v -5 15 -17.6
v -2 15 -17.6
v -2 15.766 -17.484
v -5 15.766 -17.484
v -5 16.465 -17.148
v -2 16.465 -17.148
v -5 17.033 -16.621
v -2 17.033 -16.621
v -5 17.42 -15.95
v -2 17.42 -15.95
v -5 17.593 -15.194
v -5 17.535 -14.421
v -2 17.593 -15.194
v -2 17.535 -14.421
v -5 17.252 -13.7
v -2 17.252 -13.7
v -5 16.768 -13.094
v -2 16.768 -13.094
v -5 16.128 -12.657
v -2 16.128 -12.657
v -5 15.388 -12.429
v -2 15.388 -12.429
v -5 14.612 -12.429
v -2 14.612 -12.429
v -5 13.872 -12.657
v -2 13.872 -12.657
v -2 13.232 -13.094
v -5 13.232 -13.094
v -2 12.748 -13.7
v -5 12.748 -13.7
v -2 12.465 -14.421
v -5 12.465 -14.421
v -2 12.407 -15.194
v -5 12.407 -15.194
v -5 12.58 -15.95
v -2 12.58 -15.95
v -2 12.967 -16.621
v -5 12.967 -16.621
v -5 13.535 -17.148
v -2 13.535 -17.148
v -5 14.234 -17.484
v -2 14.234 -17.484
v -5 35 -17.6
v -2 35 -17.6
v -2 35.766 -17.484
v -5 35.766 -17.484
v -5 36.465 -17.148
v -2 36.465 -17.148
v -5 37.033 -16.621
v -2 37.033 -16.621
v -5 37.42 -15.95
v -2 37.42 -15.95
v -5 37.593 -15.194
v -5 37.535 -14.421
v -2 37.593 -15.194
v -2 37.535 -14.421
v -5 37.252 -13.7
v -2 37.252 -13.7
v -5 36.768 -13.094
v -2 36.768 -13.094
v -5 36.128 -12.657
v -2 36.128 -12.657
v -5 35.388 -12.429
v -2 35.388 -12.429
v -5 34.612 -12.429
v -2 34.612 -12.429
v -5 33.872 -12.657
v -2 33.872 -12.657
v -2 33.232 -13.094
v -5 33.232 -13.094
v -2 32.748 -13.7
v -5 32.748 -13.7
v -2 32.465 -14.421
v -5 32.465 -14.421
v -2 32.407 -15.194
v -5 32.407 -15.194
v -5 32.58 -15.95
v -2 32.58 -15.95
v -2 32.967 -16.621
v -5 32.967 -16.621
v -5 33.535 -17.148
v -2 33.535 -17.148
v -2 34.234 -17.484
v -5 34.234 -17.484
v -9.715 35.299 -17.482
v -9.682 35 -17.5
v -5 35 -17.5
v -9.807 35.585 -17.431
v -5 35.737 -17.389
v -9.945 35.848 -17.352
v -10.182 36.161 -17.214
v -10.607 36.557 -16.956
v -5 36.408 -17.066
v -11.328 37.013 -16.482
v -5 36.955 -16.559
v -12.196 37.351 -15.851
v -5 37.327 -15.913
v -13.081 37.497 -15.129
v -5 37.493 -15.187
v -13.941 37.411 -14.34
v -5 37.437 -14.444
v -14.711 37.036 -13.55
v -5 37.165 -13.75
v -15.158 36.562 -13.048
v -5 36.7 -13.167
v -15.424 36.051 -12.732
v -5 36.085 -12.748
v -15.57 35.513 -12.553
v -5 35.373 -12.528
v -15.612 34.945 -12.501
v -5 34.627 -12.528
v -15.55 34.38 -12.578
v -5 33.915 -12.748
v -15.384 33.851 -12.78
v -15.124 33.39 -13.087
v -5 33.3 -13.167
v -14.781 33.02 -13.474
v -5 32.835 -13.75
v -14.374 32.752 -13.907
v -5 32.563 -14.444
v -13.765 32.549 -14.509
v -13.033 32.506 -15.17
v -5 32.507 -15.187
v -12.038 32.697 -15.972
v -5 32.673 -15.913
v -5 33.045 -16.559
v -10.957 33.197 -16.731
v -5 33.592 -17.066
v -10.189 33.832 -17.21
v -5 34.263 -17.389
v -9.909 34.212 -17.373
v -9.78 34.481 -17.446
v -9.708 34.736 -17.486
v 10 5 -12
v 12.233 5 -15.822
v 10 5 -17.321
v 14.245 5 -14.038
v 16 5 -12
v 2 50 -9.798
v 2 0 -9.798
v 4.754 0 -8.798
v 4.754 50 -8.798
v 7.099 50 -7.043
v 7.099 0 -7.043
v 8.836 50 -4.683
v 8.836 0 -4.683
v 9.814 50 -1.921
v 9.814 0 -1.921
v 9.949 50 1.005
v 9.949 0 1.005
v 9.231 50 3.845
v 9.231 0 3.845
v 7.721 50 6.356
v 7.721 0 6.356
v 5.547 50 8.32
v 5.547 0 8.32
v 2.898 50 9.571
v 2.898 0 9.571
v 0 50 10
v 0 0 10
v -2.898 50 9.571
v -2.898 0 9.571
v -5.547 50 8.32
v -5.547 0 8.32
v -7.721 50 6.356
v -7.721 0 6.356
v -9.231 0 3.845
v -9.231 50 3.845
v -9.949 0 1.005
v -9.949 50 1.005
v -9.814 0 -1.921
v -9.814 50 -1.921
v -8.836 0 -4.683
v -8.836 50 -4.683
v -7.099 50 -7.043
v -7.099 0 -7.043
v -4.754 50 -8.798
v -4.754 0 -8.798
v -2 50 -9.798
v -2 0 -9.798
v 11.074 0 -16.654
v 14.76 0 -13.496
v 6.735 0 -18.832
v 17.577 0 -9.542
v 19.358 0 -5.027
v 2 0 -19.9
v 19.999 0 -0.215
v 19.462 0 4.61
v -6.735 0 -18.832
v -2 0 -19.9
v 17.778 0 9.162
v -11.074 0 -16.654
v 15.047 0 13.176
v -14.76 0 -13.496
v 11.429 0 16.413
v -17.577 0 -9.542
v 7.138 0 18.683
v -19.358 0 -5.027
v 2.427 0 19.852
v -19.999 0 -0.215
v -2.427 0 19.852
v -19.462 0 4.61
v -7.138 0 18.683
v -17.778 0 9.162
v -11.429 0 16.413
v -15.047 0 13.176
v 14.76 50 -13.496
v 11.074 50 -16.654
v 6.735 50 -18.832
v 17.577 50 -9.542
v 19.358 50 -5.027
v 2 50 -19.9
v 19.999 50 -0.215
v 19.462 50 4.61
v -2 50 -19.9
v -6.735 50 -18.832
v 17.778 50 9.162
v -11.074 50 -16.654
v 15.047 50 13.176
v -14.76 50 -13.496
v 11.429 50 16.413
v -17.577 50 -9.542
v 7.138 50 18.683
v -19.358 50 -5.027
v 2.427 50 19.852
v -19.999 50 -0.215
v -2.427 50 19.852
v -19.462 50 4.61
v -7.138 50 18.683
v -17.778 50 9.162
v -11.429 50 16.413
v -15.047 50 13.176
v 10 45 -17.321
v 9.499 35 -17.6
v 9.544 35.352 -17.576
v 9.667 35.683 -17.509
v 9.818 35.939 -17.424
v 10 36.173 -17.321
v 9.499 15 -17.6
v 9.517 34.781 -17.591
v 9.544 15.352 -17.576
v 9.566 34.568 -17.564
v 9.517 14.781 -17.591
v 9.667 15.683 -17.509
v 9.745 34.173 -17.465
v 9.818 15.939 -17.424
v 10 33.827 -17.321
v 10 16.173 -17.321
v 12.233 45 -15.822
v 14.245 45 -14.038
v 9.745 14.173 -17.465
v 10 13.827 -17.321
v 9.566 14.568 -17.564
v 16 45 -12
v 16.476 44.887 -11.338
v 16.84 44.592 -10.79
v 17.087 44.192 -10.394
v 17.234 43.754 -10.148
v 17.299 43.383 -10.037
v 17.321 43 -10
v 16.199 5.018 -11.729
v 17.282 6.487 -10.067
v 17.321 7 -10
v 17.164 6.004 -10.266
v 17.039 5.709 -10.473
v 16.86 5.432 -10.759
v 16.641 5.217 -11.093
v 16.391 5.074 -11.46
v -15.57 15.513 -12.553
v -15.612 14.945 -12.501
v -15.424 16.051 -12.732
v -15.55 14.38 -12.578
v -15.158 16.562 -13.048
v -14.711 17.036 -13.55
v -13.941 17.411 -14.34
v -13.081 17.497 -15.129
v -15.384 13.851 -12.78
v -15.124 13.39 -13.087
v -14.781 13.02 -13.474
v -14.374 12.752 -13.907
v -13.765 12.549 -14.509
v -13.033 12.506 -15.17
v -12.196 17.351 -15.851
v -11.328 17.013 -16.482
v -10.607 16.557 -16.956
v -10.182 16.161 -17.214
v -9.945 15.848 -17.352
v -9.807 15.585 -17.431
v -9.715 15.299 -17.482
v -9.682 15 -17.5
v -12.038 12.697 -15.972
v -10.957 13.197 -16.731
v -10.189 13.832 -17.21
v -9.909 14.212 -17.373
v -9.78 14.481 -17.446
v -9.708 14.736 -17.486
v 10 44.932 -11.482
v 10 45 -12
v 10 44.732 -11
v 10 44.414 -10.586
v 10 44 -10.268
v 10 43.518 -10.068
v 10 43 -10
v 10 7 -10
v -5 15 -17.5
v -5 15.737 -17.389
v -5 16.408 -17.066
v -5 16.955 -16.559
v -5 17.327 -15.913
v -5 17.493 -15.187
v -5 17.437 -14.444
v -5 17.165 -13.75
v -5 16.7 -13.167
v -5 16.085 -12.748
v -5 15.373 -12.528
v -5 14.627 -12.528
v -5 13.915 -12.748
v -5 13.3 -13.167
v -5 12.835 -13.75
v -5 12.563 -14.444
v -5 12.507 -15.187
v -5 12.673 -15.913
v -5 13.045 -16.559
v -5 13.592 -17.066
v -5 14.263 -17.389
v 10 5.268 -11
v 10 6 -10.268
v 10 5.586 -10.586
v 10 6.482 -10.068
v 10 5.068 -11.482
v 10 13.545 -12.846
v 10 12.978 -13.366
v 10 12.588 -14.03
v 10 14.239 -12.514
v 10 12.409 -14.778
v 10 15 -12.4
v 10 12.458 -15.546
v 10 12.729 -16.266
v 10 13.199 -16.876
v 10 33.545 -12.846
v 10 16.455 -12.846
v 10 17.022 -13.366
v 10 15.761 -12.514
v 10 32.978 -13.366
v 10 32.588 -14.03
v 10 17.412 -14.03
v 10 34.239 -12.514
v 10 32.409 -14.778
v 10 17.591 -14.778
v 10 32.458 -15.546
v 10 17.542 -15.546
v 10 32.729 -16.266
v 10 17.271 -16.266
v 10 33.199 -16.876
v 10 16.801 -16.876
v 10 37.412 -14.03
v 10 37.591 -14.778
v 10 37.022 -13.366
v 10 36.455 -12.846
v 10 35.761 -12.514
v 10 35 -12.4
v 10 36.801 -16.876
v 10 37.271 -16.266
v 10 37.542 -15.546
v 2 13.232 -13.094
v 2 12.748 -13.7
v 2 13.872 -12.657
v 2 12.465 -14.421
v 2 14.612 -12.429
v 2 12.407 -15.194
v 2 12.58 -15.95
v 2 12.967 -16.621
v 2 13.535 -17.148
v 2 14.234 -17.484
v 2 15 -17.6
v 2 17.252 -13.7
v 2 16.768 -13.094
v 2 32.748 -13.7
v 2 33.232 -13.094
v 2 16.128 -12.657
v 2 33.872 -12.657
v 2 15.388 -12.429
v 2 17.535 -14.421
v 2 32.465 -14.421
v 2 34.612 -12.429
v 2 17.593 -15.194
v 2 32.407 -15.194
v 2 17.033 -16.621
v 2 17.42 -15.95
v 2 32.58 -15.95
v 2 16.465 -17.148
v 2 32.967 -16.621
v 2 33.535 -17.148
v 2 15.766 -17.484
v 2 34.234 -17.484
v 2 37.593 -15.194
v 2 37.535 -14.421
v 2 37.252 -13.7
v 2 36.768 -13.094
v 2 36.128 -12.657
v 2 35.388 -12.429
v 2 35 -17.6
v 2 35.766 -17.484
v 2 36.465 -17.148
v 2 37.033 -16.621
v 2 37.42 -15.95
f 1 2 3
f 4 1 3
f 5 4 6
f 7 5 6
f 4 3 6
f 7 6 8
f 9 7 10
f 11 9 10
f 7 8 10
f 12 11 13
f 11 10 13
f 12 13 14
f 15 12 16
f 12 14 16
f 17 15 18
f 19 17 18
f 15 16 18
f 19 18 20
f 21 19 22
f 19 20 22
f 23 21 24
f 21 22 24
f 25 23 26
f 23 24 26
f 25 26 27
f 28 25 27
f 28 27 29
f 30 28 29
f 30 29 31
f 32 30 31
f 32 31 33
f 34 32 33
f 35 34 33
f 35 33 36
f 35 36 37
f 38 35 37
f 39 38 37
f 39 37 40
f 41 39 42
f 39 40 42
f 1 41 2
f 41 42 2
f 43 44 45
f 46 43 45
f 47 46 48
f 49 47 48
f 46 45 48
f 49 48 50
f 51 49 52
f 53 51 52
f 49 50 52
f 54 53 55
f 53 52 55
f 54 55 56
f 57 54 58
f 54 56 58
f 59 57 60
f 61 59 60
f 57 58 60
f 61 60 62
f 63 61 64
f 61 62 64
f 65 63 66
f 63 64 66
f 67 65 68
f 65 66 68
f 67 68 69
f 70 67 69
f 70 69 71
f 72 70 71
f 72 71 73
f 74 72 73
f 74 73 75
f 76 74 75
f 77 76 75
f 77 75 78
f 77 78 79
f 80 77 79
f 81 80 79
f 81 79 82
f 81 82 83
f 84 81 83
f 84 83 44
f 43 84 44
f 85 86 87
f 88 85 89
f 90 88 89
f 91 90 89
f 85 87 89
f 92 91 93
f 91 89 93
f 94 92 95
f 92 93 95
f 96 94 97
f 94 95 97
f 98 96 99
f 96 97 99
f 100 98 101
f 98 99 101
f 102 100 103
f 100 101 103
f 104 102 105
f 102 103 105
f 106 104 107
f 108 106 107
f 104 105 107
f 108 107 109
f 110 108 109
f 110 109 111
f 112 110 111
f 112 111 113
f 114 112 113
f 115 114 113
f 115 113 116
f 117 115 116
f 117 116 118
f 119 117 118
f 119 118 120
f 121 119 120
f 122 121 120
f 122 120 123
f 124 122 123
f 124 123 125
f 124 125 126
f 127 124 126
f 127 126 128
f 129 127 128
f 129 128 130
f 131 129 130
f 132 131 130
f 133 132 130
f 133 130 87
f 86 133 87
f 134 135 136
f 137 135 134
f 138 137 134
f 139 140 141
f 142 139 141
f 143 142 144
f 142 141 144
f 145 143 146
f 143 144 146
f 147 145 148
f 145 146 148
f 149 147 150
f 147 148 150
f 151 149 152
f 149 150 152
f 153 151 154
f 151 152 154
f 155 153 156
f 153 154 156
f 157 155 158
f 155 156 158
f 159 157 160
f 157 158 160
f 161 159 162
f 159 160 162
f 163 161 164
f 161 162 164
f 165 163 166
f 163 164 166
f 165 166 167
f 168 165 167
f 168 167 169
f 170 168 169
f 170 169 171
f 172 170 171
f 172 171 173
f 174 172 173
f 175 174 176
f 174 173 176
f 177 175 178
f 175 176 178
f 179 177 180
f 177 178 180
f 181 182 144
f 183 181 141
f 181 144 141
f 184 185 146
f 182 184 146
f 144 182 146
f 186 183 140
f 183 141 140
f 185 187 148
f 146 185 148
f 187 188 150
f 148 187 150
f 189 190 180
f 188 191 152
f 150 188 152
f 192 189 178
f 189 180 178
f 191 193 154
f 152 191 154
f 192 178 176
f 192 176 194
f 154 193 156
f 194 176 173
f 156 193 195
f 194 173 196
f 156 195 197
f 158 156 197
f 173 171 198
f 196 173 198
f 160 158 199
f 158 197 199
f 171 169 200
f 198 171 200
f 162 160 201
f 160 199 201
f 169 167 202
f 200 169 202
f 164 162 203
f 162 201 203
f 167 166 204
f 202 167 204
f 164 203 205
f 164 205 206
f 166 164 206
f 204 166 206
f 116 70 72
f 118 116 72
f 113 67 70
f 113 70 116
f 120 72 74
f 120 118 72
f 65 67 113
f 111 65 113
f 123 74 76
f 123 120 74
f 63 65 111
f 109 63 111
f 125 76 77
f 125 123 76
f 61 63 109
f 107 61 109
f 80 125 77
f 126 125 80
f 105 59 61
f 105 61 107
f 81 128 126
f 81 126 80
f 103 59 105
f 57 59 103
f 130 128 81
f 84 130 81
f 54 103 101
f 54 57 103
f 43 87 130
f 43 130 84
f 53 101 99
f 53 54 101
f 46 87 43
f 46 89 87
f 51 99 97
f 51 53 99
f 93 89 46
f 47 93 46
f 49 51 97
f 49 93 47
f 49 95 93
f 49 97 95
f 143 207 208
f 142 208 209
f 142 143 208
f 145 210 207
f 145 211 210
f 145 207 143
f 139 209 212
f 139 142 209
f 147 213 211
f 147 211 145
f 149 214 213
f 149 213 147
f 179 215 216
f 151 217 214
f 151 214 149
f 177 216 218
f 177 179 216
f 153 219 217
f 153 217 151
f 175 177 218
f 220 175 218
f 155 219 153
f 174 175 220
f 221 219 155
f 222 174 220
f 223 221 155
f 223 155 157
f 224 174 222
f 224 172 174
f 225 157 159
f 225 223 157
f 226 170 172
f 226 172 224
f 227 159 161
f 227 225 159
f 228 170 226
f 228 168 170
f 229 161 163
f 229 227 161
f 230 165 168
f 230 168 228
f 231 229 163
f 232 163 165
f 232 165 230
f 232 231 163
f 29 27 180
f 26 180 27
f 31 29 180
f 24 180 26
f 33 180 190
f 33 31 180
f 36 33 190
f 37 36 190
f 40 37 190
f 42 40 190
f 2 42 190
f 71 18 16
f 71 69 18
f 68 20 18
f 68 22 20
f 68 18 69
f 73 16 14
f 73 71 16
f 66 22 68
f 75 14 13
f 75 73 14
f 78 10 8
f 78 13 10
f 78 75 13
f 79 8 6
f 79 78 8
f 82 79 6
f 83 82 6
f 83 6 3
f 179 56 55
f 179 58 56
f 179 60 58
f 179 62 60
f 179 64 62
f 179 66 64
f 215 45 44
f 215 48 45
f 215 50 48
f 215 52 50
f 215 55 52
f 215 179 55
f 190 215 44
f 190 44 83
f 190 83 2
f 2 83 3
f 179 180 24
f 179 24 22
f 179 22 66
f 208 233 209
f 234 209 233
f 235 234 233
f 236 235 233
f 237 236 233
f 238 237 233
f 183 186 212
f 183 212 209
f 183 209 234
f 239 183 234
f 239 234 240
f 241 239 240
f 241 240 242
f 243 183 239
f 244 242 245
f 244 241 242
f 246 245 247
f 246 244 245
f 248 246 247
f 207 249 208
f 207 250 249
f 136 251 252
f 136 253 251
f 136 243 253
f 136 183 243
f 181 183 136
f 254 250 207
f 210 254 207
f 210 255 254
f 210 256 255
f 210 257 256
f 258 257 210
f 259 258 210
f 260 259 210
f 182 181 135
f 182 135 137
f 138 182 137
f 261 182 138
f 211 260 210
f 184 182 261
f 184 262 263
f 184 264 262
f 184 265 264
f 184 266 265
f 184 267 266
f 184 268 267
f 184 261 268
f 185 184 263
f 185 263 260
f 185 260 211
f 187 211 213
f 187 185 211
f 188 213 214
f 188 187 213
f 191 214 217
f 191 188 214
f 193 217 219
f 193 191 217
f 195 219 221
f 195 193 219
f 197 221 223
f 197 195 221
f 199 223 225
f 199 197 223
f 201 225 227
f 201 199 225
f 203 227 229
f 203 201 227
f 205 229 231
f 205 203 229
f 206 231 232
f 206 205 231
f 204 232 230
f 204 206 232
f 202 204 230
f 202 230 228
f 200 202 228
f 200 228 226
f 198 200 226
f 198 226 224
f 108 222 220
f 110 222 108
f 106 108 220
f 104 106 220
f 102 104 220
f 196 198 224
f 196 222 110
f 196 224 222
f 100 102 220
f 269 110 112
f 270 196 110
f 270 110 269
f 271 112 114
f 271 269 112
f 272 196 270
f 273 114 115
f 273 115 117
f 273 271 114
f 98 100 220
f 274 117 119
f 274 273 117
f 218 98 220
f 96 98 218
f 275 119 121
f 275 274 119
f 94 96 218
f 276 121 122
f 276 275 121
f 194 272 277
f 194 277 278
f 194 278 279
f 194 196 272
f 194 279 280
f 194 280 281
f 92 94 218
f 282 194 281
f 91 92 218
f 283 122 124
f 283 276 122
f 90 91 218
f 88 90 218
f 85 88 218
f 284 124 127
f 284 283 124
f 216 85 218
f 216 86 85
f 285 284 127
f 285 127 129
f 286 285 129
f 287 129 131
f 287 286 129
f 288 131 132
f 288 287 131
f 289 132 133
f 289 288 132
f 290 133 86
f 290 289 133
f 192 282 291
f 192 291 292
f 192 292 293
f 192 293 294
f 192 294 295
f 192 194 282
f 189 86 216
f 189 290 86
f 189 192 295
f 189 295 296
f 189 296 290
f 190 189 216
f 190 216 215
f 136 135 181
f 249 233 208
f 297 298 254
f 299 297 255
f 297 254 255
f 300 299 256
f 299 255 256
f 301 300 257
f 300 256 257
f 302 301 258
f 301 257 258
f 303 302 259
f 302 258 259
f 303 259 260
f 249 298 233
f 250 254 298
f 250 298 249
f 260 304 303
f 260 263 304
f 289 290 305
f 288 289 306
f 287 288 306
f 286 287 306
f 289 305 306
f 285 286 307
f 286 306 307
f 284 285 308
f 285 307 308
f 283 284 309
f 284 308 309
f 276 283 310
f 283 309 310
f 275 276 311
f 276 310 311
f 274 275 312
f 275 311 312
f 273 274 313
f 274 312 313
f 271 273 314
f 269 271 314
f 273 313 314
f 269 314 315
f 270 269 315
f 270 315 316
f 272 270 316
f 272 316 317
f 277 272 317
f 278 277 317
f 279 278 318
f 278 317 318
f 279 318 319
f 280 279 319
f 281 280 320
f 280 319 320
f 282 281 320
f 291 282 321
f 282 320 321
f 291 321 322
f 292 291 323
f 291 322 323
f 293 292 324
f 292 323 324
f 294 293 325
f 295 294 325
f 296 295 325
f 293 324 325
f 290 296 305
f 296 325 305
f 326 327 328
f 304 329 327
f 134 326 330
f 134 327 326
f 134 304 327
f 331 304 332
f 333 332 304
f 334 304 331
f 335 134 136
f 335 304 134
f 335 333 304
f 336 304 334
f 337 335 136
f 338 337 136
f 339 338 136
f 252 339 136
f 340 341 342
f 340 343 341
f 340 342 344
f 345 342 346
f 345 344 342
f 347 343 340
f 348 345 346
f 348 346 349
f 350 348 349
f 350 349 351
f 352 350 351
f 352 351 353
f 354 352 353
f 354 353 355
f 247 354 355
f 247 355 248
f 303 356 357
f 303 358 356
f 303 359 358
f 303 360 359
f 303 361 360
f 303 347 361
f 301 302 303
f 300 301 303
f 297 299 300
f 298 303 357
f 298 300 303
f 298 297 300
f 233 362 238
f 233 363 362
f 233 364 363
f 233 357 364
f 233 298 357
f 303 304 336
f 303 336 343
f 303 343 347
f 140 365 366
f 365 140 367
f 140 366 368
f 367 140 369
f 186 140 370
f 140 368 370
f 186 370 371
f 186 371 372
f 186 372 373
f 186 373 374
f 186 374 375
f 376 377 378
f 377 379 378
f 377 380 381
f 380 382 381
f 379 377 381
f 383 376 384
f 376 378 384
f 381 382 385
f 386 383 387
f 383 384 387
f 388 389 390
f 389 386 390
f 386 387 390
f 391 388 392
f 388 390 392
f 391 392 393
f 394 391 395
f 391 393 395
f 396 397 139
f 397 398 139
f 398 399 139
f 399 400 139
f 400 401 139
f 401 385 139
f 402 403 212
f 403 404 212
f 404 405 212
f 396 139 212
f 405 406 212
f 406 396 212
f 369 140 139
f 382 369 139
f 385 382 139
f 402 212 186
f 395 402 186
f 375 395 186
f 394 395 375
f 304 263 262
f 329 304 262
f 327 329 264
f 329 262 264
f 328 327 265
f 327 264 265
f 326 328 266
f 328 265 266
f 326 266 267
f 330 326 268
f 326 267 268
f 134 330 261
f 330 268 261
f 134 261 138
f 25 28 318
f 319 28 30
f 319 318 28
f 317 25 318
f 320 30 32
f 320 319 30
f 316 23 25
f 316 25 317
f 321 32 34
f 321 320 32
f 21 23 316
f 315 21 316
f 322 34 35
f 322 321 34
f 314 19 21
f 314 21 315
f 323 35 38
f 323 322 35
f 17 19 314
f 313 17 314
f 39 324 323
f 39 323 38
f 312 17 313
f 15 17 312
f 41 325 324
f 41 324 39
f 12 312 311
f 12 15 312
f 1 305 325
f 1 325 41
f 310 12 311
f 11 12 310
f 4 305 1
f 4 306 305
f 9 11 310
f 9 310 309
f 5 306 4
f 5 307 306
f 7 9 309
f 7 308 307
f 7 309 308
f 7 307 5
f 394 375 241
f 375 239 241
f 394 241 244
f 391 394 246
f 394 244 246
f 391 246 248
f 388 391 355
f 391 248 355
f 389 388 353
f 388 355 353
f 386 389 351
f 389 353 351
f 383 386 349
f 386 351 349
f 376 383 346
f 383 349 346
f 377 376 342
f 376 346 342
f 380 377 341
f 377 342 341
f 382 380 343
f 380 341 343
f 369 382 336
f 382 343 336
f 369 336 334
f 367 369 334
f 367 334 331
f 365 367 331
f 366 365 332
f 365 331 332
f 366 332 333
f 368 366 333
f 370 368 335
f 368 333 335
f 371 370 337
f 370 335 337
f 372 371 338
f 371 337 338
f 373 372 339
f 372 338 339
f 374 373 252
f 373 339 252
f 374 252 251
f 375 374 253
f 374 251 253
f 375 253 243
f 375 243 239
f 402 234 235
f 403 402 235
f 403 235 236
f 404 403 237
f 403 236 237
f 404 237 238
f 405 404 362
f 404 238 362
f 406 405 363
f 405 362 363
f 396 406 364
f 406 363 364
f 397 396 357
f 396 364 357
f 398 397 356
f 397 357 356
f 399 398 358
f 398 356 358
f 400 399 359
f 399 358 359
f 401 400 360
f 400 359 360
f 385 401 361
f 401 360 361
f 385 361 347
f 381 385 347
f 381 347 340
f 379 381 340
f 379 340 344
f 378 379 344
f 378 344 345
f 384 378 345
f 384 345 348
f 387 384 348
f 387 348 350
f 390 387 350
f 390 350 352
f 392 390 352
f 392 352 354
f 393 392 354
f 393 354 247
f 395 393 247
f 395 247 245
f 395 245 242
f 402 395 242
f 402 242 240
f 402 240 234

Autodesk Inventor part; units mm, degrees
ref_plane "YZ Plane" through (0, 0, 0) normal (1, 0, 0) x (0, 1, 0)
ref_plane "XZ Plane" through (0, 0, 0) normal (0, 1, 0) x (-1, 0, 0)
sketch "Skizze1" plane through (0, 0, 0) normal (0, 1, 0) x (-1, 0, 0)
  circle A0 centre (0, 0) radius 10
  circle A1 centre (0, 0) radius 20
  dimension "d0" = 20
  dimension "d1" = 40
extrude "Extrusion1" add sketch "Skizze1" along normal blind 50
sketch "Skizze2" plane through (0, 50, 0) normal (0, 1, 0) x (1, 0, 0)
  line L0 (0, 0) -> (2, 0)
  line L1 (2, 0) -> (2, 25)
  line L2 (2, 25) -> (0, 25)
  line L3 (0, 25) -> (0, 0)
  line L4 (0, 0) -> (-2, 0)
  line L5 (-2, 0) -> (-2, 25)
  line L6 (-2, 25) -> (0, 25)
  line L7 (0, 25) -> (0, 0)
  dimension "d4" = 2
  dimension "d5" = 25
  dimension "d6" = 2
  dimension "d7" = 25
extrude "Extrusion2" cut sketch "Skizze2" against normal blind 50
ref_plane "Arbeitsebene1" through (20, 0, 0) normal (1, 0, 0) x (0, 0, -1)
sketch "Skizze5" plane through (20, 0, 0) normal (1, 0, 0) x (0, 0, -1)
  line L0 (0, 0) -> (10, 0)
  line L1 (-10, 0) -> (9.798, 0) projected
  line L2 (10, 0) -> (10, 5)
  line L3 (10, 7) -> (10, 43)
  line L4 (12, 45) -> (18, 45)
  line L5 (20, 43) -> (20, 7)
  line L6 (18, 5) -> (12, 5)
  arc A0 (18, 5) -> (20, 7) centre (18, 7) ccw
  arc A1 (10, 7) -> (12, 5) centre (12, 7) ccw
  arc A2 (12, 45) -> (10, 43) centre (12, 43) ccw
  arc A3 (20, 43) -> (18, 45) centre (18, 43) ccw
  point P0 (10, 45)
  point P1 (20, 45)
  dimension "d11" = 10
  dimension "d12" = 5
  dimension "d13" = 40
  dimension "d14" = 10
  dimension "d15" = 2
extrude "Extrusion3" cut sketch "Skizze5" against normal blind 10
sketch "Skizze6" plane through (20, 0, 0) normal (1, 0, 0) x (0, 0, -1)
  line L0 (17.3205, 5) -> (12, 5) projected
  line L1 (15, 5) -> (15, 15)
  line L2 (15, 15) -> (15, 35)
  circle A0 centre (15, 15) radius 2.5
  circle A1 centre (15, 35) radius 2.5
  point P0 (0, 0)
  point P1 (18, 5)
  dimension "d18" = 10
  dimension "d19" = 20
  dimension "d20" = 5
  dimension "d21" = 5
extrude "Extrusion4" cut sketch "Skizze6" against normal through all
thread "Gewinde1" size "M5x0.8" class "6H" standard "ANSI Metric M Profile" full length
sketch "Skizze8" plane through (20, 0, 0) normal (1, 0, 0) x (0, 0, -1)
  circle A0 centre (15, 35) radius 2.5 projected
  circle A1 centre (15, 35) radius 2.6
  arc A2 (17.3205, 15.9302) -> (17.3205, 14.0698) centre (15, 15) ccw projected
  circle A3 centre (15, 15) radius 2.6
  point P0 (0, 0)
  point P1 (14.8661, 37.4964)
  point P2 (14.8661, 32.5036)
  dimension "d30" = 5.2
  dimension "d31" = 5.2
extrude "Extrusion6" cut sketch "Skizze8" against normal blind 25 contours A0 | A1 | A3
thread "Gewinde2" size "M5x0.8" class "6H" standard "ANSI Metric M Profile" full length
thread "Gewinde3" size "M5x0.8" class "6H" standard "ANSI Metric M Profile" full length
equation "\"d0\" = durchmesser"
equation "\"durchmesser\" = 20"
properties part number "StoperKlein" material "PVC, hart"
